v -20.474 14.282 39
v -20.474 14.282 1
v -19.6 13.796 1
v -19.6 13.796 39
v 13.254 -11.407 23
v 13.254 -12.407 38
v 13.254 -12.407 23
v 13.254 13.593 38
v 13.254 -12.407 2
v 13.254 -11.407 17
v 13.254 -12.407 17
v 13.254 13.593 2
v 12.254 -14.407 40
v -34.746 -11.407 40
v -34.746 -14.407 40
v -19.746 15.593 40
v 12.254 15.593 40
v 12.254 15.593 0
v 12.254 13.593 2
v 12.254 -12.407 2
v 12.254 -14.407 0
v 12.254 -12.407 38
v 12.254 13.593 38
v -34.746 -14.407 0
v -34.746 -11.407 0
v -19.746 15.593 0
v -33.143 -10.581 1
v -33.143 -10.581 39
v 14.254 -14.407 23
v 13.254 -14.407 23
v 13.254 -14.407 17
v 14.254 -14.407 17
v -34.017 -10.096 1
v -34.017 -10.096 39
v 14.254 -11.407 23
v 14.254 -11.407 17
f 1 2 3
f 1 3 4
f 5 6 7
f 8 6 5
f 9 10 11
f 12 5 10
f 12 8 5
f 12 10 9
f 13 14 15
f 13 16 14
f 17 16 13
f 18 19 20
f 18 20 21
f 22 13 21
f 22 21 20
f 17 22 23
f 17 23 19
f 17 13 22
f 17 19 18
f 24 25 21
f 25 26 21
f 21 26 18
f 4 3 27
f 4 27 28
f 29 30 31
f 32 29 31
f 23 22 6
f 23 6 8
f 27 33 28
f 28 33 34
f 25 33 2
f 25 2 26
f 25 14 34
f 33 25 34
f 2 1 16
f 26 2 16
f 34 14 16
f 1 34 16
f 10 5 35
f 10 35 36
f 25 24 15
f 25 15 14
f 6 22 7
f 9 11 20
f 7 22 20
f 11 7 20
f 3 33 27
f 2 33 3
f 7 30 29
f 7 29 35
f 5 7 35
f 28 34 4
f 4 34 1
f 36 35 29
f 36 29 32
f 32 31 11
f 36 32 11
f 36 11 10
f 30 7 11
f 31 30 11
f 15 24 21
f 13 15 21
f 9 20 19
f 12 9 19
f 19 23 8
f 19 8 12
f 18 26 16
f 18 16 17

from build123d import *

# Parameters (mm, degrees)
SKETCH1_W           = 50
SKETCH1_H           = 30
BOSS_EXTRUDE1_DEPTH = 40
CUT_EXTRUDE15_DEPTH = 40
SKETCH33_W          = 38
SKETCH33_H          = 27.886890423
CUT_EXTRUDE16_DEPTH = 1
SKETCH36_W          = 3
SKETCH36_H          = 30
CUT_EXTRUDE17_DEPTH = 40
SKETCH37_W          = 36
SKETCH37_H          = 26
BOSS_EXTRUDE5_DEPTH = 1
SKETCH38_W          = 6
SKETCH38_H          = 3
BOSS_EXTRUDE6_DEPTH = 1


with BuildPart() as part:
    # Sketch1 → Boss-Extrude1 (new body)
    with BuildSketch(Plane.XY):
        with Locations((-9.745762712, 0.593220339)):
            Rectangle(SKETCH1_W, SKETCH1_H)
    extrude(amount=BOSS_EXTRUDE1_DEPTH)

    # Sketch29 → Cut-Extrude15 (cut)
    with BuildSketch(Plane.XY.offset(40)):
        Polygon((-34.745762712, -11.406779661), (-19.745762712, 15.593220339), (-34.745762712, 15.593220339), align=None)
    extrude(amount=-CUT_EXTRUDE15_DEPTH, mode=Mode.SUBTRACT)

    # Sketch33 → Cut-Extrude16 (cut)
    with BuildSketch(Plane(origin=(-21.708506556, 12.06028142, 0), x_dir=(0, 0, 1), z_dir=(-0.874157276, 0.485642931, 0))):
        with Locations((20, -11.401908276)):
            Rectangle(SKETCH33_W, SKETCH33_H)
    extrude(amount=-CUT_EXTRUDE16_DEPTH, mode=Mode.SUBTRACT)

    # Sketch36 → Cut-Extrude17 (cut)
    with BuildSketch(Plane.XY.offset(40)):
        with Locations((13.754237288, 0.593220339)):
            Rectangle(SKETCH36_W, SKETCH36_H)
    extrude(amount=-CUT_EXTRUDE17_DEPTH, mode=Mode.SUBTRACT)

    # Sketch37 → Boss-Extrude5 (add)
    with BuildSketch(Plane(origin=(12.254237288, 0, 0), x_dir=(0, 0, -1), z_dir=(1, 0, 0))):
        with Locations((-20, 0.593220339)):
            Rectangle(SKETCH37_W, SKETCH37_H)
    extrude(amount=BOSS_EXTRUDE5_DEPTH)

    # Sketch38 → Boss-Extrude6 (add)
    with BuildSketch(Plane(origin=(13.254237288, 0, 0), x_dir=(0, 0, -1), z_dir=(1, 0, 0))):
        with Locations((-20, -12.906779661)):
            Rectangle(SKETCH38_W, SKETCH38_H)
    extrude(amount=BOSS_EXTRUDE6_DEPTH)


solid = part.part
